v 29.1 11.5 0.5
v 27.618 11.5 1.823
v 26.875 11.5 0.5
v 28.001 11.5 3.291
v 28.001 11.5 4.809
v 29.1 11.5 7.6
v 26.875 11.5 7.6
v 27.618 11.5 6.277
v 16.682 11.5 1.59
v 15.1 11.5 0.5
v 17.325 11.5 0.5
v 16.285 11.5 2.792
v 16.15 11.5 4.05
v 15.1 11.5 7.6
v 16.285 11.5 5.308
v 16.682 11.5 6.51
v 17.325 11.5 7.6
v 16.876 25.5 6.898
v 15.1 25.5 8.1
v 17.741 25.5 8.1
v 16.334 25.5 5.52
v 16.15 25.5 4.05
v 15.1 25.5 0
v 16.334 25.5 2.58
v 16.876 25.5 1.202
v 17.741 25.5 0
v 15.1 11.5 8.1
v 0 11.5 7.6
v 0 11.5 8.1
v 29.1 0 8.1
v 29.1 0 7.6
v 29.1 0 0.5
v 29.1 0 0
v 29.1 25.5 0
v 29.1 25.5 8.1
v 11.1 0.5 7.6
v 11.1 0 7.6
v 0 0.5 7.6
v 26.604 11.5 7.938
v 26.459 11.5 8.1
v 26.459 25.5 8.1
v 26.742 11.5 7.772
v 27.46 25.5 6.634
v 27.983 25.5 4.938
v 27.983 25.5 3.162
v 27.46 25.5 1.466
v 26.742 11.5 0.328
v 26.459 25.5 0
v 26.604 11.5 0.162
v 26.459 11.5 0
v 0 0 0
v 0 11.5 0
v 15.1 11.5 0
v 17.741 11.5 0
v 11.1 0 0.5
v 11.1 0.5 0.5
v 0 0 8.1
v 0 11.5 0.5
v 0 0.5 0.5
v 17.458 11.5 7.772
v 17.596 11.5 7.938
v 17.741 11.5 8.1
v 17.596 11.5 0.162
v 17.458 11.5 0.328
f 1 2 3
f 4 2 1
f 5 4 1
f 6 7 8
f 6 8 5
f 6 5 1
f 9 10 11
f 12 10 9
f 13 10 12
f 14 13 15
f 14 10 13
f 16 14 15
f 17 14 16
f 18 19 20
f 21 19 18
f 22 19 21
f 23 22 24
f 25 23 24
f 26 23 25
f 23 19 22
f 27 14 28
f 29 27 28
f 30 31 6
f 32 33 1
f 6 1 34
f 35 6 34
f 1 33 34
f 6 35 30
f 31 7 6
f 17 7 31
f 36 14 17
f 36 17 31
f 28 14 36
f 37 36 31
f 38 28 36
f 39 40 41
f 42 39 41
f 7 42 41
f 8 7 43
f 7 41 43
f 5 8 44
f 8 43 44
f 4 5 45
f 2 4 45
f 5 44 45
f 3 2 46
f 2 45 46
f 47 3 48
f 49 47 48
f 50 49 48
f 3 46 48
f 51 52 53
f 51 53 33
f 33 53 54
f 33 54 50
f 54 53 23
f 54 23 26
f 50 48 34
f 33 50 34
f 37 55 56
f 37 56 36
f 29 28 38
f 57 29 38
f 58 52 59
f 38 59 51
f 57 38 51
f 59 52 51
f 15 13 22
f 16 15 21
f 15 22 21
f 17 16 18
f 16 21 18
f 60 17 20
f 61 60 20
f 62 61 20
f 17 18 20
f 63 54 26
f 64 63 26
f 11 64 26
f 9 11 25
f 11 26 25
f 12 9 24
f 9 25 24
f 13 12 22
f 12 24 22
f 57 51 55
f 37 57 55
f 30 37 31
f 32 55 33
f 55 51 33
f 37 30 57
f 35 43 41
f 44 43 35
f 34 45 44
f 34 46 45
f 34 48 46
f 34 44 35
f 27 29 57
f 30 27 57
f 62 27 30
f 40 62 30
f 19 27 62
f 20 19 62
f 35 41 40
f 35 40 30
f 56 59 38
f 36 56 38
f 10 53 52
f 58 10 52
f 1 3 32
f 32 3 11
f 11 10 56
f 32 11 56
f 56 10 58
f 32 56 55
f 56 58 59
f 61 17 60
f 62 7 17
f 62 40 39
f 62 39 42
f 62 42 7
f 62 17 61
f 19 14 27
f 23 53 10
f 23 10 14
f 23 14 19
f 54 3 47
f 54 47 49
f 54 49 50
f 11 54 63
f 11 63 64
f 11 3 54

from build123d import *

# Parameters (mm, degrees)
F0_W     = 14
F0_H     = 14
F1_DEPTH = 8.1
F2_W     = 18
F2_H     = 7.1
F3_DEPTH = 11.5
F5_DEPTH = 14
F6_W     = 11
F6_H     = 7.1
F7_DEPTH = 25


with BuildPart() as f1:
    # F0 (on Top) → F1 (new body)
    with BuildSketch(Plane.XY):
        Polygon((0, 11.5), (0, 0), (29.1, 0), (29.1, 11.5), (15.1, 11.5), align=None)
        with Locations((22.1, 18.5)):
            Rectangle(F0_W, F0_H)
    extrude(amount=F1_DEPTH)

    # F2 (on face) → F3 (cut)
    with BuildSketch(Plane.XZ):
        with Locations((20.1, 4.05)):
            Rectangle(F2_W, F2_H)
    extrude(amount=-F3_DEPTH, mode=Mode.SUBTRACT)

    # F4 (on face) → F5 (cut)
    with BuildSketch(Plane(origin=(0, 25.5, 0), x_dir=(-1, 0, 0), z_dir=(0, 1, 0))):
        with BuildLine():
            ThreePointArc((-17.741101, 0), (-16.562042, 1.874333), (-16.15, 4.05))
            ThreePointArc((-16.15, 4.05), (-16.562042, 6.225667), (-17.741101, 8.1))
            Line((-17.741101, 8.1), (-26.458899, 8.1))
            ThreePointArc((-26.458899, 8.1), (-28.05, 4.05), (-26.458899, 0))
            Line((-26.458899, 0), (-17.741101, 0))
        make_face()
    extrude(amount=-F5_DEPTH, mode=Mode.SUBTRACT)

    # F6 (on face) → F7 (cut)
    with BuildSketch(Plane(origin=(0, 0, 0), x_dir=(0, -1, 0), z_dir=(-1, 0, 0))):
        with Locations((-6, 4.05)):
            Rectangle(F6_W, F6_H)
    extrude(amount=-F7_DEPTH, mode=Mode.SUBTRACT)


solid = f1.part
